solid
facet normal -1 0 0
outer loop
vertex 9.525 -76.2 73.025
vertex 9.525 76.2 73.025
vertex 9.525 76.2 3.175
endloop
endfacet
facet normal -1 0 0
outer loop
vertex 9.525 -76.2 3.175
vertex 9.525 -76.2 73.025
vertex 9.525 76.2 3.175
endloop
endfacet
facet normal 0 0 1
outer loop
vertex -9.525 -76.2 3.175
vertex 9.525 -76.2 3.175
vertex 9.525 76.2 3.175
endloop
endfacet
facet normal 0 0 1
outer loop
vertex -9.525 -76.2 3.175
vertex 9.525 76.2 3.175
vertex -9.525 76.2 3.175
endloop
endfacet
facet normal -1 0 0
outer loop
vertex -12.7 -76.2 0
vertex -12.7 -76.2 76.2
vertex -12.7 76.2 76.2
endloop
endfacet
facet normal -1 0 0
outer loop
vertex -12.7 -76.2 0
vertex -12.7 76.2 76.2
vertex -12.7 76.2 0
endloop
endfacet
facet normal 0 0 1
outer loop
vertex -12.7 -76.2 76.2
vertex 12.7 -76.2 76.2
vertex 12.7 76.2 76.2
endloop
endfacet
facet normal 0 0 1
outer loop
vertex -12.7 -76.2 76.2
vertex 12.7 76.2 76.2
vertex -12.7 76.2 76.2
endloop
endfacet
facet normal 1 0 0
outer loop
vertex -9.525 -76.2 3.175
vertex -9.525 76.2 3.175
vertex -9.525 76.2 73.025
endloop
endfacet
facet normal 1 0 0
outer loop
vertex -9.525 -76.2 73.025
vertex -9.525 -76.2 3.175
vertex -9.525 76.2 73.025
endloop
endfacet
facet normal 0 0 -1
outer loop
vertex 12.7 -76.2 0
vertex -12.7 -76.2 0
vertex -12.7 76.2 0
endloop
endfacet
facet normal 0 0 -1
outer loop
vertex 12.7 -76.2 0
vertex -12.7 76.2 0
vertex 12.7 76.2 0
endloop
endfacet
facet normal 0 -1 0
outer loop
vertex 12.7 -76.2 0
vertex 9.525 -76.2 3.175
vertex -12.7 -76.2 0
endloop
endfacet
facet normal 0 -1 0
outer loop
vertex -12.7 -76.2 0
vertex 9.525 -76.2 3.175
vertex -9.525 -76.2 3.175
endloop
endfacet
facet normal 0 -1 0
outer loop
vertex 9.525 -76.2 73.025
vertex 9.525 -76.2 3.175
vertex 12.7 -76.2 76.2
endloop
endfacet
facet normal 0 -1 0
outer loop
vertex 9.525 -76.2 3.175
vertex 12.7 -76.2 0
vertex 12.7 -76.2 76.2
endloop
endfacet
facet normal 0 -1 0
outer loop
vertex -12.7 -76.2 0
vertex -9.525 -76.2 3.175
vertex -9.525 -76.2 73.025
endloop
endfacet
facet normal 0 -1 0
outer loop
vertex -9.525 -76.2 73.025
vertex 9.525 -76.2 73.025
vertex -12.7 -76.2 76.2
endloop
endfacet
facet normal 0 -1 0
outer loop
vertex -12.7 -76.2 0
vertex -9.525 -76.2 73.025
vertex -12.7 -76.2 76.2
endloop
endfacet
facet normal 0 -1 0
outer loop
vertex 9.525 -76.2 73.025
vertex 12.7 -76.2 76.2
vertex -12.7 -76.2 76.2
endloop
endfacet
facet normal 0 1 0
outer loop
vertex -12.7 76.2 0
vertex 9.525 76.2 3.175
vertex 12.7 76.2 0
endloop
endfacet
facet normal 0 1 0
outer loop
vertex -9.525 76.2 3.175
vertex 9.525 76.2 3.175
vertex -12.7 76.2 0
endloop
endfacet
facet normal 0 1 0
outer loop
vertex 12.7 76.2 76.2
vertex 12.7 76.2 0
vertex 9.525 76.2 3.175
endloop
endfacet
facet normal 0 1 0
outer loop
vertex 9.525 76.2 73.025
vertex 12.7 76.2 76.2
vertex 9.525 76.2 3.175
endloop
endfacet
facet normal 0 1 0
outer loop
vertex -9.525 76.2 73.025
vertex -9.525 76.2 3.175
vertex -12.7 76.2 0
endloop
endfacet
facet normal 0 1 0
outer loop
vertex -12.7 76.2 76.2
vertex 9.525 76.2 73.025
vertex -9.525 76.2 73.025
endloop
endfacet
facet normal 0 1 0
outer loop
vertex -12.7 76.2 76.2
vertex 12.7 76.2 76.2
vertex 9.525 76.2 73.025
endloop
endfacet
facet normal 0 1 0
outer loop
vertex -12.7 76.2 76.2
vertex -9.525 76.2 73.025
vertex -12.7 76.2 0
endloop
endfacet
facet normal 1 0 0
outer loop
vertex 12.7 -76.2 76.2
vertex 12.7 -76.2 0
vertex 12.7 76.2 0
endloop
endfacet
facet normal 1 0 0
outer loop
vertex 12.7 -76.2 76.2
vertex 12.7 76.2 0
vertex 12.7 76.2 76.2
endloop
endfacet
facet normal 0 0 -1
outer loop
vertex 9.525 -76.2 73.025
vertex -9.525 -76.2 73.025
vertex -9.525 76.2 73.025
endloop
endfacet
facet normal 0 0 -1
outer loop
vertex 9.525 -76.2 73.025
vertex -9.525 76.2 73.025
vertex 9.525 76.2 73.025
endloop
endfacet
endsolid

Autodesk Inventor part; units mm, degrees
ref_plane "YZ Plane" through (0, 0, 0) normal (1, 0, 0) x (0, 1, 0)
ref_plane "XZ Plane" through (0, 0, 0) normal (0, 1, 0) x (-1, 0, 0)
ref_plane "XY Plane" through (0, 0, 0) normal (0, 0, 1) x (1, 0, 0)
sketch "Sketch1" plane through (0, 0, 0) normal (0, 1, 0) x (-1, 0, 0)
  line L0 (-12.7, 76.2) -> (12.7, 76.2)
  line L1 (12.7, 76.2) -> (12.7, 0)
  line L2 (12.7, 0) -> (-12.7, 0)
  line L3 (-12.7, 0) -> (-12.7, 76.2)
  line L4 (9.525, 73.025) -> (-9.525, 73.025)
  line L5 (-9.525, 73.025) -> (-9.525, 3.175)
  line L6 (-9.525, 3.175) -> (9.525, 3.175)
  line L7 (9.525, 3.175) -> (9.525, 73.025)
  point P0 (0, 0)
  dimension "d0" = 25.4
  dimension "d1" = 76.2
  dimension "d2" = 0
  dimension "d3" = 12.7
  dimension "d4" = 3.175
extrude "Extrusion1" add sketch "Sketch1" along normal mid plane 152.4
properties part number "2x4 StandIn- 2021"
